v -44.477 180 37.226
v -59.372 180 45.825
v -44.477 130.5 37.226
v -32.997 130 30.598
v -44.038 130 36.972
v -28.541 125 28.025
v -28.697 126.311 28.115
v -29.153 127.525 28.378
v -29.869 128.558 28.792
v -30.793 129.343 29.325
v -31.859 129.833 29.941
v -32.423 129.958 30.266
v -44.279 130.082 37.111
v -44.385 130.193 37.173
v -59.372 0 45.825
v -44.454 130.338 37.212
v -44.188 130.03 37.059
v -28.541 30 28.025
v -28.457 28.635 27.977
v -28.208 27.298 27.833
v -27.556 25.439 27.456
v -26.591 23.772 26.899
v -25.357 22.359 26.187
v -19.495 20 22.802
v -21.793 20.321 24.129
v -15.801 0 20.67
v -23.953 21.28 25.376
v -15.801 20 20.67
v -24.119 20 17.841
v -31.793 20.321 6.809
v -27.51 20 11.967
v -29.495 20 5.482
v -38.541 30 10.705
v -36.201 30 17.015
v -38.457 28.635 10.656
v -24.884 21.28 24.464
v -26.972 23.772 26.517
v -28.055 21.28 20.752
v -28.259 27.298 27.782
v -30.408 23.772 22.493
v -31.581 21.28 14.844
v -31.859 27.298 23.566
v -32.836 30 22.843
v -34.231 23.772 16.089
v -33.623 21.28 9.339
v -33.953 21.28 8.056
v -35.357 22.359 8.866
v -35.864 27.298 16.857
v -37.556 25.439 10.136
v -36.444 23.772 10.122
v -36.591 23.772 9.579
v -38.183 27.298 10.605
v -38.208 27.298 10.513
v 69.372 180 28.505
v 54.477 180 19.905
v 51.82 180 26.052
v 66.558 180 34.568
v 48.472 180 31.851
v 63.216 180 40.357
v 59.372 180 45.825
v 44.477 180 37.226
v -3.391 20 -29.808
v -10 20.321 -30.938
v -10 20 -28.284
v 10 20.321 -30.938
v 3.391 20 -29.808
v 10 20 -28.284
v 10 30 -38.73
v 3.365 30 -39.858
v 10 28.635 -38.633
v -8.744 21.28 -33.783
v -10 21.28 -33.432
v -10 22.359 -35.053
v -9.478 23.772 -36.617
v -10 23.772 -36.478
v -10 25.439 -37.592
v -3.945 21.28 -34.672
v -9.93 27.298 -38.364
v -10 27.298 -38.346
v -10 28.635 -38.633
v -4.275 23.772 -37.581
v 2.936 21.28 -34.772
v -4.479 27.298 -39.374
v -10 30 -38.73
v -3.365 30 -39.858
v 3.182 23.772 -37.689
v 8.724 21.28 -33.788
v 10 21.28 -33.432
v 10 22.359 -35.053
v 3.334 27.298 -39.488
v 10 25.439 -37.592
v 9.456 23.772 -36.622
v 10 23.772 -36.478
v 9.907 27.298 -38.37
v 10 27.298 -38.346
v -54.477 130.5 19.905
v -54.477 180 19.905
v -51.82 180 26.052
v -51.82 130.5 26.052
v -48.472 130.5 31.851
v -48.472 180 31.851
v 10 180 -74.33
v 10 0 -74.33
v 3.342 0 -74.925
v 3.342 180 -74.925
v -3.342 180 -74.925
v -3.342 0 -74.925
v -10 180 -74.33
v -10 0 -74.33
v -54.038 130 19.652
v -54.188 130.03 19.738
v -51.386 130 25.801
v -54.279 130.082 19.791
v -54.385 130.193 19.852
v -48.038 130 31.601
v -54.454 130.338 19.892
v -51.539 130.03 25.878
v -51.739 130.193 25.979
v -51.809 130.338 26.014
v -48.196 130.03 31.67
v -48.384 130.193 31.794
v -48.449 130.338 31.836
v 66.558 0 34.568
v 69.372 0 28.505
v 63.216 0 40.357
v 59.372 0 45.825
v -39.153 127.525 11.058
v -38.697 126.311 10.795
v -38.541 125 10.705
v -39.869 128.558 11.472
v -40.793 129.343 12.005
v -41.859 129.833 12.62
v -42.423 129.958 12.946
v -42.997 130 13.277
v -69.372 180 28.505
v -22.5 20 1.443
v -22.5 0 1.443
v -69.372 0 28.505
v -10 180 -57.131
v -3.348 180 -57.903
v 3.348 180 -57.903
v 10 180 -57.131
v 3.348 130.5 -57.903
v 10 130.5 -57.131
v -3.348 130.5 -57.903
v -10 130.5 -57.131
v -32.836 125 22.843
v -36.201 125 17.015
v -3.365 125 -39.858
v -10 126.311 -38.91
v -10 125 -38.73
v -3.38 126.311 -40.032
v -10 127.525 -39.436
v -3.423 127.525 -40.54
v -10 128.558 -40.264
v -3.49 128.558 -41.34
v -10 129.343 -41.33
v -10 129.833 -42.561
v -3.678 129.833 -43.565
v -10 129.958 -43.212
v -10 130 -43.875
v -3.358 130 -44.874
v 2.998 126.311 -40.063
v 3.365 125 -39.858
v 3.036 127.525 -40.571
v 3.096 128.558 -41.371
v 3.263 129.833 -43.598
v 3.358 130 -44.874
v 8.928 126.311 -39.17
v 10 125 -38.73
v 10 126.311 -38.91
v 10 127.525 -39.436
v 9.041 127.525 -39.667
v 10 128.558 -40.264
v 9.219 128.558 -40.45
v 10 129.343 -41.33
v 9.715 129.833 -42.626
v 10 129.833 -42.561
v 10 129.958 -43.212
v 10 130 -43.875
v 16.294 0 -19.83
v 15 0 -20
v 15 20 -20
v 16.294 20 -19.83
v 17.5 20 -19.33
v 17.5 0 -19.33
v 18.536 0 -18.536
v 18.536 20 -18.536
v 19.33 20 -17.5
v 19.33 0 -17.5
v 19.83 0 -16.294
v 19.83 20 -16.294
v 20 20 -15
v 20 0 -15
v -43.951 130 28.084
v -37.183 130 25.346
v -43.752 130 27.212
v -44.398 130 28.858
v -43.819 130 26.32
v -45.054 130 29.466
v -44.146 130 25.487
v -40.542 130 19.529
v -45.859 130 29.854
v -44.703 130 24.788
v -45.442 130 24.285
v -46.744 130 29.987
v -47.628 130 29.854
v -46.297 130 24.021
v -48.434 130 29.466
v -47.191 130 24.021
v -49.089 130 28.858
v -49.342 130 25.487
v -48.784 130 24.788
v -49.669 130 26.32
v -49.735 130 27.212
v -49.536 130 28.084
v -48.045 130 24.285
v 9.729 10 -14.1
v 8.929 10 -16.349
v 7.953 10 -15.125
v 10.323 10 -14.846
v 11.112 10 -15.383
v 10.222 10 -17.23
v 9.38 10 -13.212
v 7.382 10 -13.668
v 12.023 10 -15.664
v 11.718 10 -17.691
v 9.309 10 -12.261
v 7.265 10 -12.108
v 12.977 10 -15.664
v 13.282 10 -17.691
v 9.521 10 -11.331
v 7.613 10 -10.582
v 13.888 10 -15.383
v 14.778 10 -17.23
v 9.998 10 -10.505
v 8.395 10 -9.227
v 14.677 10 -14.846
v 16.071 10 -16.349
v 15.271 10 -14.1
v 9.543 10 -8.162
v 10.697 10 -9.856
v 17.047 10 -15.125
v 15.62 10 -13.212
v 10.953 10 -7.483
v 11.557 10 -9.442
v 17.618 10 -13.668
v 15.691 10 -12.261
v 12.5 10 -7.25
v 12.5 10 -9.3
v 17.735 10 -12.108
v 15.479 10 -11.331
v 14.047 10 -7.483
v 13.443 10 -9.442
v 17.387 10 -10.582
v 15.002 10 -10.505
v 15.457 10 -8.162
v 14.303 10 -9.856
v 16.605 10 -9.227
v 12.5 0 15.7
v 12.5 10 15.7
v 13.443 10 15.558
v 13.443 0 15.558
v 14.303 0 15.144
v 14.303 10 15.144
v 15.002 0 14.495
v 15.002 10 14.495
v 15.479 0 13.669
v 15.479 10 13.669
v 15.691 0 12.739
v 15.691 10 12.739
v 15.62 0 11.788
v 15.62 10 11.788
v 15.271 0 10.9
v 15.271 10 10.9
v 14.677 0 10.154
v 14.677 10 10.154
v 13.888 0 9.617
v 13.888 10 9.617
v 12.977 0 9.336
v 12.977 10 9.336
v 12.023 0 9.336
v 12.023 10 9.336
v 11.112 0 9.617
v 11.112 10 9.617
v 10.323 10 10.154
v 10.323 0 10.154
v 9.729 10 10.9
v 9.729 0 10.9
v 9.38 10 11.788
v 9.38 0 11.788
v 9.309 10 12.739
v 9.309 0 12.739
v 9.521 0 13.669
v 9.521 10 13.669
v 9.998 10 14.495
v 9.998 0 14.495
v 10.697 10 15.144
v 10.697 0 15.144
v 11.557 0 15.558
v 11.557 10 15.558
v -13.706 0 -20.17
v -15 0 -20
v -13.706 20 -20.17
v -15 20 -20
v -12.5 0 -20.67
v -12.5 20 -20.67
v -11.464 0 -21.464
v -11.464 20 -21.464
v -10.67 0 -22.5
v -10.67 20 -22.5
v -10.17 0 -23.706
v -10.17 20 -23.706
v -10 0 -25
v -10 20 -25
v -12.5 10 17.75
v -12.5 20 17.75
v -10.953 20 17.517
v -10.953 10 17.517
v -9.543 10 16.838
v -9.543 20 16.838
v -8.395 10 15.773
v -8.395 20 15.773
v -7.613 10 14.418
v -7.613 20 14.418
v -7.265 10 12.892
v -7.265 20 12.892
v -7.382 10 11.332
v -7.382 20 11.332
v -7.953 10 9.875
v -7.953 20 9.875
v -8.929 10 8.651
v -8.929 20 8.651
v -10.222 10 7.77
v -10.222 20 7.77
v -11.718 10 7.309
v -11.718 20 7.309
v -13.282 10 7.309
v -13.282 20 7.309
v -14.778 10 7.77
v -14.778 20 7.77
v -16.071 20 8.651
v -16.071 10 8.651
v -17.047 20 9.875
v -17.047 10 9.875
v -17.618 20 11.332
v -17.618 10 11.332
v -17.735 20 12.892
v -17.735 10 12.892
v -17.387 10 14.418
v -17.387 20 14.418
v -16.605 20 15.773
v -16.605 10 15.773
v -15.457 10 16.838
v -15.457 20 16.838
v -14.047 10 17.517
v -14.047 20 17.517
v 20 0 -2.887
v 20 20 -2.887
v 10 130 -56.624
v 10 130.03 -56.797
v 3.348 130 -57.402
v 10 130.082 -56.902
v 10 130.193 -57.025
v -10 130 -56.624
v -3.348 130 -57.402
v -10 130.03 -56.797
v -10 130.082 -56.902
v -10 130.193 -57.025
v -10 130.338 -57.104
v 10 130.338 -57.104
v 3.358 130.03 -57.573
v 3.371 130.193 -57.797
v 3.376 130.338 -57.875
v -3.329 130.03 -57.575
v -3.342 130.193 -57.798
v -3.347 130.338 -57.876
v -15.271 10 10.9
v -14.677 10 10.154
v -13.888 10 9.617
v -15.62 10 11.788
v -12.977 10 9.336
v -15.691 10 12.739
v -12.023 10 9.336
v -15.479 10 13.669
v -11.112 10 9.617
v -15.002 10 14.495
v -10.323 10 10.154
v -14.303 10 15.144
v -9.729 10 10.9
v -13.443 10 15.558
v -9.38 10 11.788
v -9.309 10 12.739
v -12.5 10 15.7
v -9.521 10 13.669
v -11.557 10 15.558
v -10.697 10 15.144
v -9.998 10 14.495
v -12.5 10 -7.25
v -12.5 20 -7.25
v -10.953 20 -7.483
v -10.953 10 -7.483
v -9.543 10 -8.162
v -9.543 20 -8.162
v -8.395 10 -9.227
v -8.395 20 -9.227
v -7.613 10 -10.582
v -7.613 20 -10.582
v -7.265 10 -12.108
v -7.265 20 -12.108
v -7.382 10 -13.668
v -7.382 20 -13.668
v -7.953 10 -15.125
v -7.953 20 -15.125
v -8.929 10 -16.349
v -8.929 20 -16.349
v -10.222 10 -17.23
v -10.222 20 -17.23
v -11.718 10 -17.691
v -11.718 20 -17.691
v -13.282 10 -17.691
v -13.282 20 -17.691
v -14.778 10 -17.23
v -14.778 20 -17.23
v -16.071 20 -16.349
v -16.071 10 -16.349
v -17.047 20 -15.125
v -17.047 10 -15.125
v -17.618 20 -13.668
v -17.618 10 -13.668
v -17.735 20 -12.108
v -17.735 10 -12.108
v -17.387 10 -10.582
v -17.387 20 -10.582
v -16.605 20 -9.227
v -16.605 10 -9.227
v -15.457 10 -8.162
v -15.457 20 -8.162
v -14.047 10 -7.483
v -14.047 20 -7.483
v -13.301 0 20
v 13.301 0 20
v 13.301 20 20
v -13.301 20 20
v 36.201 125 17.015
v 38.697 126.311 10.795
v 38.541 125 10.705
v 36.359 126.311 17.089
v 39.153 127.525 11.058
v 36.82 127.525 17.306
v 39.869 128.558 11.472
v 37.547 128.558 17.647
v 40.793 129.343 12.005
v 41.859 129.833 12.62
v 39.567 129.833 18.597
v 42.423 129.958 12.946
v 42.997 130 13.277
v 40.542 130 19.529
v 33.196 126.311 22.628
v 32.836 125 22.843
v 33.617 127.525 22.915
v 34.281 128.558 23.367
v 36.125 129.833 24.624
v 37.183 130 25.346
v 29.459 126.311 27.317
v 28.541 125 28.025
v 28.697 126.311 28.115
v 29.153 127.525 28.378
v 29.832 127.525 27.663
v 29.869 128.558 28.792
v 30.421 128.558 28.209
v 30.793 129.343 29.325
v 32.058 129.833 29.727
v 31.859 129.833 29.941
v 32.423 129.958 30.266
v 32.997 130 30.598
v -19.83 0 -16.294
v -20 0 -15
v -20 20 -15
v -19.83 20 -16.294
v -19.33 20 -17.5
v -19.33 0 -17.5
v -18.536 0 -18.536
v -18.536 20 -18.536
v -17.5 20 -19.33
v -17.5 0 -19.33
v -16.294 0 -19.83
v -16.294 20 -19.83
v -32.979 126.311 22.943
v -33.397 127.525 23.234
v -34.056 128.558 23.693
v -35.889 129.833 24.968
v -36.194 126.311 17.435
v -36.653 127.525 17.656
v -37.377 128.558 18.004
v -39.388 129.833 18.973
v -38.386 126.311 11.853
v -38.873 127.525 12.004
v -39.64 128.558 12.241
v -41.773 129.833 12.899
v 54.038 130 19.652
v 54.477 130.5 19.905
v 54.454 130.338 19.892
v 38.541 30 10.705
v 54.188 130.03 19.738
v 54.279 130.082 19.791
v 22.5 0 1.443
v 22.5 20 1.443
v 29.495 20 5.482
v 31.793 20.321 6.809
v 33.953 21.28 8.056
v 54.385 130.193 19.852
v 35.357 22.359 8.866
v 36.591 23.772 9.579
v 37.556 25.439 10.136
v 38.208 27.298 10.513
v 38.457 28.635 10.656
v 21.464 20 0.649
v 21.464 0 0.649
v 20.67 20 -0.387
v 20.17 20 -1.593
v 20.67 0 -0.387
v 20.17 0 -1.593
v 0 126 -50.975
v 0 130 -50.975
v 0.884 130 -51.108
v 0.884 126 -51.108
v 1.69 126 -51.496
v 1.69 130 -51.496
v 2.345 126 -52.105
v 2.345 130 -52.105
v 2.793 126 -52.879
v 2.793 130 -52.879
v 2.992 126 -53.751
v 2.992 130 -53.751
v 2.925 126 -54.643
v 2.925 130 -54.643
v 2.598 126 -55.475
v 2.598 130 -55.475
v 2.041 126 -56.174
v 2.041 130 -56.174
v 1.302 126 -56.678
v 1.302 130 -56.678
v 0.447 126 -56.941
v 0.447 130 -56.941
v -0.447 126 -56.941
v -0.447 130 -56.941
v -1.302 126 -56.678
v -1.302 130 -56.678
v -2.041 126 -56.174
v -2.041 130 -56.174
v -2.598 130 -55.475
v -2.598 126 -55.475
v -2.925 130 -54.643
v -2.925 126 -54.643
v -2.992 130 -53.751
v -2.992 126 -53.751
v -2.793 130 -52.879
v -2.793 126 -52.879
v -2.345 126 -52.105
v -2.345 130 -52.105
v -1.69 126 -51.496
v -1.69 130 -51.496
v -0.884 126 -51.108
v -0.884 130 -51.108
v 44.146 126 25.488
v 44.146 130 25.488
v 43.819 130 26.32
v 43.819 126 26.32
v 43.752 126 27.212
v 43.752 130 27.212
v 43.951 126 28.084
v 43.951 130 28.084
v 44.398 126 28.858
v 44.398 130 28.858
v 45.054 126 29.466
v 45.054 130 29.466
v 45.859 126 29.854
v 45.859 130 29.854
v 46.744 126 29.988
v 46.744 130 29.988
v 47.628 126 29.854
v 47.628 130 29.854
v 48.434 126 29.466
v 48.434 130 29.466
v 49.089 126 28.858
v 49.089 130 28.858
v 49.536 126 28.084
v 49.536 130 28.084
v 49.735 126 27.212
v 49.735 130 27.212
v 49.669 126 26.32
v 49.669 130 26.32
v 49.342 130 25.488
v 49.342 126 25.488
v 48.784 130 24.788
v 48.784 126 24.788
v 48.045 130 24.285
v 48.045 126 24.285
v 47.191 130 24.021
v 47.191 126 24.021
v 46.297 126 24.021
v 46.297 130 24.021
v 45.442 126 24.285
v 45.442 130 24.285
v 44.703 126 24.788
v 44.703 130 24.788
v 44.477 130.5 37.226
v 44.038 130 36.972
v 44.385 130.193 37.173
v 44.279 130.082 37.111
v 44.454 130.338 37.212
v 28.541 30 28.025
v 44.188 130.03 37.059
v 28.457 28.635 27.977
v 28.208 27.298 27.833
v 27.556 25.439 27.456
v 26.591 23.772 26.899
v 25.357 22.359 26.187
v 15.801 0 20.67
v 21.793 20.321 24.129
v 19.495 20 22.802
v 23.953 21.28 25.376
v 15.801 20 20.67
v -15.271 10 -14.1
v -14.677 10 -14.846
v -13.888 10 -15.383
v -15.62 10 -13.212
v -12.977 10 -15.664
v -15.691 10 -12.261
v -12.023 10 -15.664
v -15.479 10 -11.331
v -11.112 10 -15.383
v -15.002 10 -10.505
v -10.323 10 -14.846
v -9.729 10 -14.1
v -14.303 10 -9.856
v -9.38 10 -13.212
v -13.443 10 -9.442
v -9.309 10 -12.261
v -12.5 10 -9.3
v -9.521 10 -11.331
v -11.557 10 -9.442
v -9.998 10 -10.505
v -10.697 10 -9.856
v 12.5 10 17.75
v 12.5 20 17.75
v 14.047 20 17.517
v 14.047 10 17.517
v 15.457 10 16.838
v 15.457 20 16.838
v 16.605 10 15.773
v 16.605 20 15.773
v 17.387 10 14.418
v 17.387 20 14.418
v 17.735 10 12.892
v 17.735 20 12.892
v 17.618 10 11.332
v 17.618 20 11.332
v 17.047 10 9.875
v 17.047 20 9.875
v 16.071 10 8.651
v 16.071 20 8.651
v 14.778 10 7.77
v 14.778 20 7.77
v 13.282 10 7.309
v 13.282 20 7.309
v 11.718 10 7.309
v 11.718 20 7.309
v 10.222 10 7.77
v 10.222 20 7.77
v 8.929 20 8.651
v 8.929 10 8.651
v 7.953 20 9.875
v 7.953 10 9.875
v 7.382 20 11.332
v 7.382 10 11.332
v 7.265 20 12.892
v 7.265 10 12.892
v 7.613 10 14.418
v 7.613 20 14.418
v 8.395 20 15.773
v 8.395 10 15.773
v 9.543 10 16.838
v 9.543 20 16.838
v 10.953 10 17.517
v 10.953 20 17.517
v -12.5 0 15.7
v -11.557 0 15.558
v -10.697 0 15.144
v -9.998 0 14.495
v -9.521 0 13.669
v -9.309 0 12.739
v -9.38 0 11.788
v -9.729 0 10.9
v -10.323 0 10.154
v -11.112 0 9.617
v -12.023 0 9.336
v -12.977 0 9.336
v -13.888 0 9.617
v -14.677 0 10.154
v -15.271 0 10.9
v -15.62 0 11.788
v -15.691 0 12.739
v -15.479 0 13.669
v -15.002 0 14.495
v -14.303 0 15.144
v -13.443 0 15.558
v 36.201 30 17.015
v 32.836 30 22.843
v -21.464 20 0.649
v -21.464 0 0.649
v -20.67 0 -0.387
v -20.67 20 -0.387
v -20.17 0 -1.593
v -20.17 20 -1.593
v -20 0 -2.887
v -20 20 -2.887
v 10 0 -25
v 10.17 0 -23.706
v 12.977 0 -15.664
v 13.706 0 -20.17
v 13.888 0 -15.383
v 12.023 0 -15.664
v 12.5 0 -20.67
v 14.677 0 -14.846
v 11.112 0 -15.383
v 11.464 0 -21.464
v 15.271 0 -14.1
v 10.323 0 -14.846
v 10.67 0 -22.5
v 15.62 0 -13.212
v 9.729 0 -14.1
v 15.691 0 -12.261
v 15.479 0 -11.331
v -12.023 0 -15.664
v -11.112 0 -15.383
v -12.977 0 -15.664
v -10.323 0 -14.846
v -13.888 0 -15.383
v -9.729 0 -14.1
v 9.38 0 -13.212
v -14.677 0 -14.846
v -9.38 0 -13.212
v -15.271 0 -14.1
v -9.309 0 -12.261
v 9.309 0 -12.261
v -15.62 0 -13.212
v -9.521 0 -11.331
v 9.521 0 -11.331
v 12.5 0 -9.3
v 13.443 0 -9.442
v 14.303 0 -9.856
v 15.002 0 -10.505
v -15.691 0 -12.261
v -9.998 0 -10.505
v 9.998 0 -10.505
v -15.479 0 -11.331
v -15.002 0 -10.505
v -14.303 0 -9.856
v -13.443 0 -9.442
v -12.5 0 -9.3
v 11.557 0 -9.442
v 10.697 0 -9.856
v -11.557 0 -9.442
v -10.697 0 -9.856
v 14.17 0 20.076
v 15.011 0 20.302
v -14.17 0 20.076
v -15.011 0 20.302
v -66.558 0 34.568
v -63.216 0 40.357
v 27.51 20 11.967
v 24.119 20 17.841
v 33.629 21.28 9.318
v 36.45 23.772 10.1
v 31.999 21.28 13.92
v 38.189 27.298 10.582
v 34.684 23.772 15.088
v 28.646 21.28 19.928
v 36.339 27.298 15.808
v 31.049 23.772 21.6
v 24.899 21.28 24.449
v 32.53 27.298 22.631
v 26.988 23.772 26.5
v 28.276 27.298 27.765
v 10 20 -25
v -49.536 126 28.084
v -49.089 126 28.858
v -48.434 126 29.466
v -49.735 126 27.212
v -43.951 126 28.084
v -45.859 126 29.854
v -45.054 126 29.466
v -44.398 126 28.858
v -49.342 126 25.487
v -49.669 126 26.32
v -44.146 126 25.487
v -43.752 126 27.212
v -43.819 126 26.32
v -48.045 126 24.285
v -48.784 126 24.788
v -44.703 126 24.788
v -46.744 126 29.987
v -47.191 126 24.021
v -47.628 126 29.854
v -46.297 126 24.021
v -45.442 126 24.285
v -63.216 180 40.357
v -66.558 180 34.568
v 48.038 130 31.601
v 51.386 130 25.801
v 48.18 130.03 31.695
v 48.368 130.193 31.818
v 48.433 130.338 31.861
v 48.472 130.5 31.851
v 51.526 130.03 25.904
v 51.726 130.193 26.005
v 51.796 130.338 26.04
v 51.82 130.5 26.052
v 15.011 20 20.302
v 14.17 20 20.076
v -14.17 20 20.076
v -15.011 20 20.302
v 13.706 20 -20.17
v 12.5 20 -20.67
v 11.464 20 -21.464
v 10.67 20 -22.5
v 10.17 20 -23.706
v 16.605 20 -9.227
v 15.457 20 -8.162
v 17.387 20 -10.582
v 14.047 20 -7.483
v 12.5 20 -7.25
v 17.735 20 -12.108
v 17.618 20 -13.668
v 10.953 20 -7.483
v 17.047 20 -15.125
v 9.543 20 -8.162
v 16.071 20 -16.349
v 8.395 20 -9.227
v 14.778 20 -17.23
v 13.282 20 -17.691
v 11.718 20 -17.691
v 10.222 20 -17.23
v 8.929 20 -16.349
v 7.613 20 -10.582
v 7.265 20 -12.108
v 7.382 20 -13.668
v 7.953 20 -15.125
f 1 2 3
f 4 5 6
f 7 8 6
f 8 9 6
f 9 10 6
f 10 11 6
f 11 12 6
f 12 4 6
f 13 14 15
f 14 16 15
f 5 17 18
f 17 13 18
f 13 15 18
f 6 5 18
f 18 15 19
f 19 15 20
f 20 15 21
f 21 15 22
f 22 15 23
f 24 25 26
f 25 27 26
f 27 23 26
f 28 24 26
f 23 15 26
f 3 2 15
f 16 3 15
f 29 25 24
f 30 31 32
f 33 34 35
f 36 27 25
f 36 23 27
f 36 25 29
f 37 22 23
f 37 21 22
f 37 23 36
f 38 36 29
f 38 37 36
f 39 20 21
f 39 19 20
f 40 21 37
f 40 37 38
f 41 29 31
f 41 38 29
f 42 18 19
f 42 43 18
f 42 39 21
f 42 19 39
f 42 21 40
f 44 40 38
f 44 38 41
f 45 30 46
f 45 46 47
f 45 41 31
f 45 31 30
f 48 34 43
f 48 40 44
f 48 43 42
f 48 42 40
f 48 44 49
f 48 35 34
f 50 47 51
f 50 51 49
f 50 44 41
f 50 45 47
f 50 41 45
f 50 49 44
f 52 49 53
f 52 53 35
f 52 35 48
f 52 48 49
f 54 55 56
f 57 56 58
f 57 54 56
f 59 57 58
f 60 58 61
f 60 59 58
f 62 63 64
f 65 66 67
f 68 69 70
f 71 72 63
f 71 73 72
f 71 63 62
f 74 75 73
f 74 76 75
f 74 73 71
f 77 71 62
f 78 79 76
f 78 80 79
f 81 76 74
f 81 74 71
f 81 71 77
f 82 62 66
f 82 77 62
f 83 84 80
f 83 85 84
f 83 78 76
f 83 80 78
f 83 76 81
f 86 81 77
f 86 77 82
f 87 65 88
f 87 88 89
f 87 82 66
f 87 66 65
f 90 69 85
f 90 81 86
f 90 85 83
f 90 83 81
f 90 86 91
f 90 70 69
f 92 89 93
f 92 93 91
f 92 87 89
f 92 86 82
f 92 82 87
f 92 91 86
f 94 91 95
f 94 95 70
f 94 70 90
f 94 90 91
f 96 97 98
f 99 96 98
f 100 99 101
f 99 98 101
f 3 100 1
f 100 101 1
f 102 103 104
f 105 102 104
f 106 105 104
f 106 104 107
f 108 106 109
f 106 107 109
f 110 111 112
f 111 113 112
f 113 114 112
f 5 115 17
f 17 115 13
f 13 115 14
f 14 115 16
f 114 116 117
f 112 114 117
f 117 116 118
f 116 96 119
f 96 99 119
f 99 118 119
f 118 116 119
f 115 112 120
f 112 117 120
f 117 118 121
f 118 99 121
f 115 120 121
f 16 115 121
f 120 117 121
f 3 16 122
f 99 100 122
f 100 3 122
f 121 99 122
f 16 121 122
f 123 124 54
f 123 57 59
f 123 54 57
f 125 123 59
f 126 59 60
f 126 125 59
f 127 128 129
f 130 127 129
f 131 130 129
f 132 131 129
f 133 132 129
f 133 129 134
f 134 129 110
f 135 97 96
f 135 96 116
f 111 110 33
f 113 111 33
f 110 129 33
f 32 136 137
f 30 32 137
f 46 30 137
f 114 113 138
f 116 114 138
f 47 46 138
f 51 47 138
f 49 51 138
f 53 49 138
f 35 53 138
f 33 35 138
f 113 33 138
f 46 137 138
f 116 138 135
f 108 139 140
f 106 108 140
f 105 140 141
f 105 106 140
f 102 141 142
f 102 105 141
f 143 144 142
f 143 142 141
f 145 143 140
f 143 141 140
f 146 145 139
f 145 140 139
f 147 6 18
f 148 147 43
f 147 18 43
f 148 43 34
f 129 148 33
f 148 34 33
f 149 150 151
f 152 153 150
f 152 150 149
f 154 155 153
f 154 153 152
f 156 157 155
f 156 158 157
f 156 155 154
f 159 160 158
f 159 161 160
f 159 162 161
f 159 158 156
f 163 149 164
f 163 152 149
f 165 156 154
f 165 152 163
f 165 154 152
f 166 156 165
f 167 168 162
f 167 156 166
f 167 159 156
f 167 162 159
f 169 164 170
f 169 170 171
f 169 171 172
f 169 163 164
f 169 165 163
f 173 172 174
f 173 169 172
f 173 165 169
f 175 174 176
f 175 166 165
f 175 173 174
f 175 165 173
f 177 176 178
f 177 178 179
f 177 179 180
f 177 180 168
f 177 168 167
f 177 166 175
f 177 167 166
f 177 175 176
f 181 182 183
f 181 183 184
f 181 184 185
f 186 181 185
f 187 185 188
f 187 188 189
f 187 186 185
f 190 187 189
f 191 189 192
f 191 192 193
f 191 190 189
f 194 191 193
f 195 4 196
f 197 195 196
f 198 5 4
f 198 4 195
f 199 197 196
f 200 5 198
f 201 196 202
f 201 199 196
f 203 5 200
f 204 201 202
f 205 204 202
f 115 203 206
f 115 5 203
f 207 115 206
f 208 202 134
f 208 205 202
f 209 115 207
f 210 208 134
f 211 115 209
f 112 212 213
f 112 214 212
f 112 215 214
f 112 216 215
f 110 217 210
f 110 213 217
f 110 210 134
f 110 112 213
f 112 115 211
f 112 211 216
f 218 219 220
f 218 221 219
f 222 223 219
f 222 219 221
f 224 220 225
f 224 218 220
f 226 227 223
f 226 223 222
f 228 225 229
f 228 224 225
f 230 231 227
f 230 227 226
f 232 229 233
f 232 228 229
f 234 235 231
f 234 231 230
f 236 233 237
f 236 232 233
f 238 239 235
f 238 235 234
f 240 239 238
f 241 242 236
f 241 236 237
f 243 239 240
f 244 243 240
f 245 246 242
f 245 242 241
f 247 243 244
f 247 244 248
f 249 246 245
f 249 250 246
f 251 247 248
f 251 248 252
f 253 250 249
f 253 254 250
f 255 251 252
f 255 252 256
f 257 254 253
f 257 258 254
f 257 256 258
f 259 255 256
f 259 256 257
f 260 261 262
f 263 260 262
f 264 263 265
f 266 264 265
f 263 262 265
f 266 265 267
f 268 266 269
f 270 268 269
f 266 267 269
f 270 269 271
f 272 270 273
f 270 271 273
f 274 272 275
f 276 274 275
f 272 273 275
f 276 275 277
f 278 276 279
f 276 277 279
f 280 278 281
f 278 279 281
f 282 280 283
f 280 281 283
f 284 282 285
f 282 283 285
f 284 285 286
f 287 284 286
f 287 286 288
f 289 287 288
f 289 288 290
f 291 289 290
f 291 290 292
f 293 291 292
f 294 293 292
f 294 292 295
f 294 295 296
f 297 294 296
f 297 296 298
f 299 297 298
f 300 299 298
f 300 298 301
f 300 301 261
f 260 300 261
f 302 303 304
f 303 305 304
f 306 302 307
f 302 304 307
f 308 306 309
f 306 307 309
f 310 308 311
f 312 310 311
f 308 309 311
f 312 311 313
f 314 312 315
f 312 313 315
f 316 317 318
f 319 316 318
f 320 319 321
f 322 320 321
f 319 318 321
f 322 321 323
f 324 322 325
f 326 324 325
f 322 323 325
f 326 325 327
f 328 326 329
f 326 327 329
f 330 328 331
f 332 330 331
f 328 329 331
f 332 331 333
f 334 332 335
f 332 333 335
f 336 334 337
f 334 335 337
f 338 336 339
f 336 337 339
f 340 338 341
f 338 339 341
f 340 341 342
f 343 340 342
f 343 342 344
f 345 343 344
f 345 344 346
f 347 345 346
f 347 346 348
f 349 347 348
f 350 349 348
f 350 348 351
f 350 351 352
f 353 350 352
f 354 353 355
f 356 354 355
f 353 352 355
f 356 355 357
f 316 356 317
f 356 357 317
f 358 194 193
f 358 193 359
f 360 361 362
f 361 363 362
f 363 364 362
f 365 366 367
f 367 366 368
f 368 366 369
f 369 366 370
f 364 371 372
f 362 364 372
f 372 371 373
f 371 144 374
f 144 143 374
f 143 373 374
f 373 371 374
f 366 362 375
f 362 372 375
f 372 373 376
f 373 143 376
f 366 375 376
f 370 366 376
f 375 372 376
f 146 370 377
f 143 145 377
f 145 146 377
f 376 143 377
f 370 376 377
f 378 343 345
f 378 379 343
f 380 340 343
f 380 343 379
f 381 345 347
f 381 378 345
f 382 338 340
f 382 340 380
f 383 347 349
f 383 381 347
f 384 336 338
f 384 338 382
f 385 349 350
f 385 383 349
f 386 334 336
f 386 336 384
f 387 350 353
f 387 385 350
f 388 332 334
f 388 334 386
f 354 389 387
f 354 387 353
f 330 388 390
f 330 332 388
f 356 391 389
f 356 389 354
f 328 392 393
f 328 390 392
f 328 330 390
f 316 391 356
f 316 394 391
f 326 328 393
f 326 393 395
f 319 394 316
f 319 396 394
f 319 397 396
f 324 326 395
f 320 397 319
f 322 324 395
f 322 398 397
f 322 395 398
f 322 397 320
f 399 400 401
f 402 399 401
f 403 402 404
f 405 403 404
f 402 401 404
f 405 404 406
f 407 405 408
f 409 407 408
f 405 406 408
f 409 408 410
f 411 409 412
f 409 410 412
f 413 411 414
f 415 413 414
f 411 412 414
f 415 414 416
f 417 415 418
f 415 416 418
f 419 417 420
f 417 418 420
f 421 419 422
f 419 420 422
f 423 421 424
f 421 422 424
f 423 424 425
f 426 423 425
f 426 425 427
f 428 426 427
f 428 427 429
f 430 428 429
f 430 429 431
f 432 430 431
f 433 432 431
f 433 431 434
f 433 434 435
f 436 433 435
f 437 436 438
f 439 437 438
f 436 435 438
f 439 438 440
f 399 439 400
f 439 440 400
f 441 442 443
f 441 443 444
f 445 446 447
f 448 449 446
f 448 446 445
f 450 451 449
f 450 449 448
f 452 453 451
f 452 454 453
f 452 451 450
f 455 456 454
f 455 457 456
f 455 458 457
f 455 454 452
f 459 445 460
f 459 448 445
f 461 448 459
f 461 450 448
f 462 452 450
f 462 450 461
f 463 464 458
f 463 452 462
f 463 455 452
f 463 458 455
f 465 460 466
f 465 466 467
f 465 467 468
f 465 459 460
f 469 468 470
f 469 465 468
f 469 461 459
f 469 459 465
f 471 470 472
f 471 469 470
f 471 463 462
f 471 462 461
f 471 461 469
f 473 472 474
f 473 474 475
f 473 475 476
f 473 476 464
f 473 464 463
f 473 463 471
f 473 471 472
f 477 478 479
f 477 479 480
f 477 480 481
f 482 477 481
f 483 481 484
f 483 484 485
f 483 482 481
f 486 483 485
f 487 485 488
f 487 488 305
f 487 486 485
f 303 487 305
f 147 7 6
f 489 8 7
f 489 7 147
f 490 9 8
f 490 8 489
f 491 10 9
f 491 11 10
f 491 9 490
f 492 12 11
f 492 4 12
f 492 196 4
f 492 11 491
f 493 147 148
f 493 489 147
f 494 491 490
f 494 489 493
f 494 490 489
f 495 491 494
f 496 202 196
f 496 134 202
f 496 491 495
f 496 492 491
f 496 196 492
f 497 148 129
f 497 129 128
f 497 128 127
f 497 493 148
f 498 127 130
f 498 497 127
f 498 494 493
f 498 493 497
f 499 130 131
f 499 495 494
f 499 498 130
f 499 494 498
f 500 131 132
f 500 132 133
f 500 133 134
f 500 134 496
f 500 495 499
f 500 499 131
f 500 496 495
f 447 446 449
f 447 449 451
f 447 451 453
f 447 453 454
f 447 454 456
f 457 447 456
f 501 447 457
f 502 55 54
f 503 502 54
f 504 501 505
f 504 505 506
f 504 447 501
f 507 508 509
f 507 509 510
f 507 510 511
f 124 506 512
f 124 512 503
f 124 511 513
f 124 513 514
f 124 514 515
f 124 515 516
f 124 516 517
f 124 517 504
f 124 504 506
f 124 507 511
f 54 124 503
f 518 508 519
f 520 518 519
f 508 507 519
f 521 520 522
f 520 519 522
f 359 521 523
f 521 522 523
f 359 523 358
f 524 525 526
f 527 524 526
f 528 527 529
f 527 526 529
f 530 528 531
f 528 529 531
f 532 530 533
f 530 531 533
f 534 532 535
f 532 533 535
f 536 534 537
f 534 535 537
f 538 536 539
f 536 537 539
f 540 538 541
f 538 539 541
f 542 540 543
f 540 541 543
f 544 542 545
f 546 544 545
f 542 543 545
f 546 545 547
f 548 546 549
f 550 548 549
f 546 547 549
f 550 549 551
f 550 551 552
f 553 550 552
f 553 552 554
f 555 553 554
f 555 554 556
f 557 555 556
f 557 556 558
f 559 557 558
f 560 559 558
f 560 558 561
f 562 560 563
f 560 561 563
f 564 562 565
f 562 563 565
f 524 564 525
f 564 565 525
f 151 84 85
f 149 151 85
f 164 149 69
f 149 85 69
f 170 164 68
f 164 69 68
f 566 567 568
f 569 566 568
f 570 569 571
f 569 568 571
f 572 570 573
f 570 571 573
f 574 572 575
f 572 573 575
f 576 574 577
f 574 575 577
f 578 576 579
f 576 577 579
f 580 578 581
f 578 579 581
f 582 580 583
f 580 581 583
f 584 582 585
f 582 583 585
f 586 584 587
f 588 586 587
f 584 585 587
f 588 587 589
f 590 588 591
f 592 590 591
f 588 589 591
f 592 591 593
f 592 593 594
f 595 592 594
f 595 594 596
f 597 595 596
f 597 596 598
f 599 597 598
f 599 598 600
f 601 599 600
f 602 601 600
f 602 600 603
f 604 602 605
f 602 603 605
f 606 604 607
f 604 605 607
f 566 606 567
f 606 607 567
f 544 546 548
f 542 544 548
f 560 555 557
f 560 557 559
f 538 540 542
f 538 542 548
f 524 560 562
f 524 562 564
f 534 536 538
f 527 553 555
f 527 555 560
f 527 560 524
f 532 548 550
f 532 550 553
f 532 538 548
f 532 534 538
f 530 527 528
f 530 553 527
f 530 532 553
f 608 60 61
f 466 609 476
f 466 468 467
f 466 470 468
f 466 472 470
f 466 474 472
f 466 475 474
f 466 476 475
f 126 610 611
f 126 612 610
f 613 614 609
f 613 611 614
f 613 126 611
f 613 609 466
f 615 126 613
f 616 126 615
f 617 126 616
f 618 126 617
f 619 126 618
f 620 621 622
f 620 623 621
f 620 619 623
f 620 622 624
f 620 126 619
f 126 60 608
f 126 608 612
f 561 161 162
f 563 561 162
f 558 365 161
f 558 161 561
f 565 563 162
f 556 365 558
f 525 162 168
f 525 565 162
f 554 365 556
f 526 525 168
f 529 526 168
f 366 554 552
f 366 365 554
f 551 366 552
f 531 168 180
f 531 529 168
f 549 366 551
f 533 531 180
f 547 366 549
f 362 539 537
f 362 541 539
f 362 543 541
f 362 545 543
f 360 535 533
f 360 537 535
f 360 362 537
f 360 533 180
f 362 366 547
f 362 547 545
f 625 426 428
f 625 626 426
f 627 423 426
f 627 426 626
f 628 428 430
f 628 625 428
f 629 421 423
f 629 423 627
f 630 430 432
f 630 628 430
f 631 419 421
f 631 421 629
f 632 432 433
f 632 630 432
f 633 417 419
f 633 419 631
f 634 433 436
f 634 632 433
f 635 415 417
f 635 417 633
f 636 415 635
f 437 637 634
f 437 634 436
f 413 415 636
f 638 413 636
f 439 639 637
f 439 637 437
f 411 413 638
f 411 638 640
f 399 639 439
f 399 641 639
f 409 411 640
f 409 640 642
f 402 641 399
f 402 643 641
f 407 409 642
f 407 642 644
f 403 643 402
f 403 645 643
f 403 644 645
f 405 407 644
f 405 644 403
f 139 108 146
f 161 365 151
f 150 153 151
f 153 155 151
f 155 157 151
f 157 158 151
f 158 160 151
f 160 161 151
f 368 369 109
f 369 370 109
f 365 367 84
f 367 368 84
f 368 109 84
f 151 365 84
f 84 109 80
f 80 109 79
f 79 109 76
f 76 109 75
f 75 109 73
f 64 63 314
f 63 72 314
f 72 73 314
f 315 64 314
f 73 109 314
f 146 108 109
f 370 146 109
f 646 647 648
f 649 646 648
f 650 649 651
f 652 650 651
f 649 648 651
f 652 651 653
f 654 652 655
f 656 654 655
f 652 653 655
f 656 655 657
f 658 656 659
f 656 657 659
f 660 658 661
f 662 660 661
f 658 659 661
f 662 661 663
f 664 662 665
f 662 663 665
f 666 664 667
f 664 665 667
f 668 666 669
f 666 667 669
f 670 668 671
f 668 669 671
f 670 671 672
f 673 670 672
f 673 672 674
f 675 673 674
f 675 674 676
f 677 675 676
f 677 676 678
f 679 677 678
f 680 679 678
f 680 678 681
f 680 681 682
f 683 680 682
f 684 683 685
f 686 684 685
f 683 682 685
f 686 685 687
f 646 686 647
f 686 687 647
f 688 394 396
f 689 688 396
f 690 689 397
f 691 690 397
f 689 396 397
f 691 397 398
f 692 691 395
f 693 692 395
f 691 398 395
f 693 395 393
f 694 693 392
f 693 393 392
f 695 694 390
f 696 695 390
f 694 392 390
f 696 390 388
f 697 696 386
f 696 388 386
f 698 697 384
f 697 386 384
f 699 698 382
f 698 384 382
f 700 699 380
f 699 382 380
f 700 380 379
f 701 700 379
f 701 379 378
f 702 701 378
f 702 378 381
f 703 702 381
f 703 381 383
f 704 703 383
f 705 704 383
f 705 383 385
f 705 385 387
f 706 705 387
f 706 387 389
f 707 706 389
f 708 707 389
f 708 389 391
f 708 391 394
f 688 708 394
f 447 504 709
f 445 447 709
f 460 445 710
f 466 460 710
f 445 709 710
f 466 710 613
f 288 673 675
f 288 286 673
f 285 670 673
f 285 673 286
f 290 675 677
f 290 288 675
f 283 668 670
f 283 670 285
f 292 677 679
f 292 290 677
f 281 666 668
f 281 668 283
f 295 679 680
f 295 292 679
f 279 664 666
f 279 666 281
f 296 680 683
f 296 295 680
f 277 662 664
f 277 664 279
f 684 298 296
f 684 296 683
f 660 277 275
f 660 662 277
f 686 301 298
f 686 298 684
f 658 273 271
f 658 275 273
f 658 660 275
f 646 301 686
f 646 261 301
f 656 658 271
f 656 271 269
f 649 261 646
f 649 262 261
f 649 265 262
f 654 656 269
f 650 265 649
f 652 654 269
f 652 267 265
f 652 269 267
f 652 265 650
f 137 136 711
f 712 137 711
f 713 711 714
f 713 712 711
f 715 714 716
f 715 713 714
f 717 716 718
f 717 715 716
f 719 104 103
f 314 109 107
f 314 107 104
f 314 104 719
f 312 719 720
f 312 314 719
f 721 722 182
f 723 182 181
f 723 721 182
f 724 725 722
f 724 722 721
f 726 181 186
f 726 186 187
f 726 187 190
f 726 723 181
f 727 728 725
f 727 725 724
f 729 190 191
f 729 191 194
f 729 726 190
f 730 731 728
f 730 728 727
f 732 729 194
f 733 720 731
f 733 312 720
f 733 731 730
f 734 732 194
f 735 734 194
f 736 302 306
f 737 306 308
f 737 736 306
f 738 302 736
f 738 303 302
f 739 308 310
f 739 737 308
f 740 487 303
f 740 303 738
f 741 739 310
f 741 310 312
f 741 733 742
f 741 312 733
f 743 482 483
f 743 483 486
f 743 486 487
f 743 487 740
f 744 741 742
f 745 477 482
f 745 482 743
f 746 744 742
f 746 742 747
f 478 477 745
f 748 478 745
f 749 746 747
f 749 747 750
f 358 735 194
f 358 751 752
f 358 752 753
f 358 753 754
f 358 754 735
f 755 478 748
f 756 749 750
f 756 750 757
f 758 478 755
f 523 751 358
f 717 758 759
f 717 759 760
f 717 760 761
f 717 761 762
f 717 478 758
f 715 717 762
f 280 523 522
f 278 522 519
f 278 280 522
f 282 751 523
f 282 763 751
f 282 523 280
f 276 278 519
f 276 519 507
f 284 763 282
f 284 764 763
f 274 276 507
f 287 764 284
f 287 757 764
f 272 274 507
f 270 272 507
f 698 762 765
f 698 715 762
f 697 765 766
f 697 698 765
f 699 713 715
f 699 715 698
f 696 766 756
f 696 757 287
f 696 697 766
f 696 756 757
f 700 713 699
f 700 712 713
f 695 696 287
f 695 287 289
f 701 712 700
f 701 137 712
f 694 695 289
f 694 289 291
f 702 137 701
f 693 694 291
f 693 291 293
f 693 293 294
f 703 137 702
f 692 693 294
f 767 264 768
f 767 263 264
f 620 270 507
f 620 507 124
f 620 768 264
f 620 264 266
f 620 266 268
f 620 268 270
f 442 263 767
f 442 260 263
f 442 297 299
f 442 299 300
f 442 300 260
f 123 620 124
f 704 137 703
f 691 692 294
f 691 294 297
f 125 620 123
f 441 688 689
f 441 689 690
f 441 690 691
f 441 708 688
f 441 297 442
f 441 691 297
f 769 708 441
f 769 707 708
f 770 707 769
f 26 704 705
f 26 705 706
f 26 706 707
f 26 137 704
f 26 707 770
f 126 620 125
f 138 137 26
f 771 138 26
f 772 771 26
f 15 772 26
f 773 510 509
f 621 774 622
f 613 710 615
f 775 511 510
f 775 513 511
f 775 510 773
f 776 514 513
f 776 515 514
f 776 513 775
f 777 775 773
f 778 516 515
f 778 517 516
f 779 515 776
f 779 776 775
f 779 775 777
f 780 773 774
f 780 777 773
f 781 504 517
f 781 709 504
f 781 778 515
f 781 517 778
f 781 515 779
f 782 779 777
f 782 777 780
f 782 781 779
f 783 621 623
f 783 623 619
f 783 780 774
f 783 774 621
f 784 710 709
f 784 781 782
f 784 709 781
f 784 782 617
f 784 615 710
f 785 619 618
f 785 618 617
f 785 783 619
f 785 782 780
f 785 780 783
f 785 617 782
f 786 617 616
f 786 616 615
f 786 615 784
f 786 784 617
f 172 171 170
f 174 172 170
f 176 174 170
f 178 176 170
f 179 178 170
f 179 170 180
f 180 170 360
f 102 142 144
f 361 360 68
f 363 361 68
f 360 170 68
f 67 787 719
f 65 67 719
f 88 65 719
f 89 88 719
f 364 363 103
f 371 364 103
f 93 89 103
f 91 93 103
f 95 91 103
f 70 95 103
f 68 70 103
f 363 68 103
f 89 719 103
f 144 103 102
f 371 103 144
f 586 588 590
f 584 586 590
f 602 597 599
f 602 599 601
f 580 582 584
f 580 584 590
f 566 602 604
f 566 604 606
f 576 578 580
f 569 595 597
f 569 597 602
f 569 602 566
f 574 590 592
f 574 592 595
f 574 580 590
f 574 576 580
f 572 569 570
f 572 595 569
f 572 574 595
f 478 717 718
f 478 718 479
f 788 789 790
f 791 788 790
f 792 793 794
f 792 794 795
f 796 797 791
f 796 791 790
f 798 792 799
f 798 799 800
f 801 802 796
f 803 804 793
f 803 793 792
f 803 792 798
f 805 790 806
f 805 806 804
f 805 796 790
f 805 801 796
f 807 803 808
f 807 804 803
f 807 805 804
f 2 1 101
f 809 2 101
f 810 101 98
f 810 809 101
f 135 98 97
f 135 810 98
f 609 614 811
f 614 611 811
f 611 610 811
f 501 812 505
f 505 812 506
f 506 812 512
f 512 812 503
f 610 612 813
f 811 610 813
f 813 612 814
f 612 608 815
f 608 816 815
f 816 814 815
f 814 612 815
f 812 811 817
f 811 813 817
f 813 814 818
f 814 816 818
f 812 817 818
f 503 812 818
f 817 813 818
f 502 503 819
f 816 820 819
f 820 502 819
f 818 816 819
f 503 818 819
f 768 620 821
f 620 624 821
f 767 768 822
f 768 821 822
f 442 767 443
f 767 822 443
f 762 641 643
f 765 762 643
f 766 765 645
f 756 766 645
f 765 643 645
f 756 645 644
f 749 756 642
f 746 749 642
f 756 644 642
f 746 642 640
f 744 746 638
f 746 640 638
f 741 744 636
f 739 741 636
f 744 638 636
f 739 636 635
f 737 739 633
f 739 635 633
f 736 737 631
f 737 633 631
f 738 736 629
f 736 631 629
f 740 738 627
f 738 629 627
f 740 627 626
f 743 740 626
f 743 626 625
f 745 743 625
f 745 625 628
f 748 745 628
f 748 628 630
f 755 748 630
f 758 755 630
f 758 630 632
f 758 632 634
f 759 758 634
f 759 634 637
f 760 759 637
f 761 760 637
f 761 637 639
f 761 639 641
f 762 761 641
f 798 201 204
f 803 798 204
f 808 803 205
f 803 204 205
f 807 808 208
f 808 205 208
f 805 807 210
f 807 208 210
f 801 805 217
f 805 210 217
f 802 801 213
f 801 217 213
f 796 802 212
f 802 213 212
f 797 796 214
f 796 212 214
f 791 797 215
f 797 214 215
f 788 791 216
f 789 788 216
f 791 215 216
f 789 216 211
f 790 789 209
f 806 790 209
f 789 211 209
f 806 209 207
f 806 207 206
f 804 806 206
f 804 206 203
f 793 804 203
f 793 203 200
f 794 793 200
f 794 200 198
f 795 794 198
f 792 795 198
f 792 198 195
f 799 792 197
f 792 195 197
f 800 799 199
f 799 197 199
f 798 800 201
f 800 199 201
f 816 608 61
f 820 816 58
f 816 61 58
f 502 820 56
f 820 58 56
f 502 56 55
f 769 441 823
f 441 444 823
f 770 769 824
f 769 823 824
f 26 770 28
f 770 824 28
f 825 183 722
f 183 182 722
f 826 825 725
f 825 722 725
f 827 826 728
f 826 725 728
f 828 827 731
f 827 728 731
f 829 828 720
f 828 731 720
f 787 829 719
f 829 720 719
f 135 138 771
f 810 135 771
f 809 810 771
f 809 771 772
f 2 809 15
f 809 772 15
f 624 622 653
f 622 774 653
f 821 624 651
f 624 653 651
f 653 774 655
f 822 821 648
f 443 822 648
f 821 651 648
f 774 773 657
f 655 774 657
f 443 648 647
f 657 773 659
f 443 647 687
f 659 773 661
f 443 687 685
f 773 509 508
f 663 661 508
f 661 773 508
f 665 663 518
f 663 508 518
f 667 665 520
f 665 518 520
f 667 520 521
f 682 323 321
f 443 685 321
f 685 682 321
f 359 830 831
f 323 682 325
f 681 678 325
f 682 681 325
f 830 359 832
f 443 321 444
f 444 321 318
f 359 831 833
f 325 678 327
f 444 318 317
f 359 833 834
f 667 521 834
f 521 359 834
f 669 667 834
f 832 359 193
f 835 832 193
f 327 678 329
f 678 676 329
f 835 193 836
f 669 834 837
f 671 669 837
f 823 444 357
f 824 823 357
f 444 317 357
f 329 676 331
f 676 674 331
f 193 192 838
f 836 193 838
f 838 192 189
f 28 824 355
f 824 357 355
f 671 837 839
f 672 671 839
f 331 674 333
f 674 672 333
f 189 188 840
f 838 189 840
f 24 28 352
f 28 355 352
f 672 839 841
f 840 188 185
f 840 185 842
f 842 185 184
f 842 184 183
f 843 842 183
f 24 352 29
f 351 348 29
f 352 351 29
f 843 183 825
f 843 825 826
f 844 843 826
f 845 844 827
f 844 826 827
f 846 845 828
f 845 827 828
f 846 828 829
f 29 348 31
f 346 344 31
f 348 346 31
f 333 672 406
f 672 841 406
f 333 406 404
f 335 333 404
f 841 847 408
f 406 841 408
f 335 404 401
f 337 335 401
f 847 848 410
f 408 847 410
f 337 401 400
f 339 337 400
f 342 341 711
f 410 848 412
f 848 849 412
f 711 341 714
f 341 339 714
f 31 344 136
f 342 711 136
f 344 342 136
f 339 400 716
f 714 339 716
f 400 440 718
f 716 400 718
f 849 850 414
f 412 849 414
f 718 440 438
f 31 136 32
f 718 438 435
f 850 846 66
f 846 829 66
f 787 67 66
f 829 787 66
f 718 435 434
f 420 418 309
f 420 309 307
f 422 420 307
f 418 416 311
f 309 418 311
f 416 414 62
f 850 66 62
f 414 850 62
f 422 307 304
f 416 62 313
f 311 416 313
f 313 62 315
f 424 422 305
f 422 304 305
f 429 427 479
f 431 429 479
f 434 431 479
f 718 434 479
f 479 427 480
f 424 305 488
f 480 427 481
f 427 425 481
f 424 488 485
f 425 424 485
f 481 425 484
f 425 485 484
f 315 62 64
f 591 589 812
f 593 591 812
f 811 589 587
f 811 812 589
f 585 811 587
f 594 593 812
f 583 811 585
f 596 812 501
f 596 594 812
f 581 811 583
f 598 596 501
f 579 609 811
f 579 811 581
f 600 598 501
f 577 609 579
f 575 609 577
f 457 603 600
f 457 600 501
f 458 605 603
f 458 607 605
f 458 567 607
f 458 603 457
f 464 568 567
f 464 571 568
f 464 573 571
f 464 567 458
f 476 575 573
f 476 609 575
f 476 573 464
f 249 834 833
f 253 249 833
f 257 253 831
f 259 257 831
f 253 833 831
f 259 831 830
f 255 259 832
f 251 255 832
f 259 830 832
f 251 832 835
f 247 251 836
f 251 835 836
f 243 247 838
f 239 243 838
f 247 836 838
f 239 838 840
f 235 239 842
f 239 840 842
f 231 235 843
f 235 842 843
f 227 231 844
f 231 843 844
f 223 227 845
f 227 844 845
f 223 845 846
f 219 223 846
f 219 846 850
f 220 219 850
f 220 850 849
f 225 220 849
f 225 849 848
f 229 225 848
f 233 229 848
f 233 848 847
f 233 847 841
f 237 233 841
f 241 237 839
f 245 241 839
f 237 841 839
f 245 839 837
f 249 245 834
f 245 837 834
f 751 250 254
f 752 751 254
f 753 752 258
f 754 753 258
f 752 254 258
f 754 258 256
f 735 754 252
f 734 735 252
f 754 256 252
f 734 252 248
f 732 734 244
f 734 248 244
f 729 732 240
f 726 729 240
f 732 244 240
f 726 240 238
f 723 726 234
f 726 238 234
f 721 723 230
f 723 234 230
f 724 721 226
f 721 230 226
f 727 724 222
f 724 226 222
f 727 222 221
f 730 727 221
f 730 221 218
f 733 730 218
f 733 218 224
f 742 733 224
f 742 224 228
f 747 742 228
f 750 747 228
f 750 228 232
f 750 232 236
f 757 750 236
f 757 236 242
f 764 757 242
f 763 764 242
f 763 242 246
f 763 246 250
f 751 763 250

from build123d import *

# Parameters (mm, degrees)
BOSS_EXTRUDE1_DEPTH = 20
BOSS_EXTRUDE2_DEPTH = 160
SKETCH3_R           = 58
CUT_EXTRUDE1_DEPTH  = 50
SKETCH4_R           = 3
CUT_EXTRUDE2_DEPTH  = 4
CIRPATTERN1_COUNT   = 3
BOSS_EXTRUDE3_DEPTH = 20
SKETCH5_R           = 3.2
CUT_EXTRUDE3_DEPTH  = 190.835375153
FILLET1_R           = 10
FILLET2_R           = 5
FILLET4_R           = 0.5
SKETCH7_R           = 5.25
CUT_EXTRUDE4_DEPTH  = 10


with BuildPart() as part:
    # Sketch1 → Boss-Extrude1 (new body)
    with BuildSketch(Plane(origin=(0, 0, 0), x_dir=(1, 0, 0), z_dir=(0, 1, 0))):
        with BuildLine():
            Line((-10, 0), (-10, 74.330343737))
            ThreePointArc((-10, 74.330343737), (0, 75), (10, 74.330343737))
            Line((10, 74.330343737), (10, 0))
            ThreePointArc((10, 0), (0, -10), (-10, 0))
        make_face()
    boss_extrude1 = extrude(amount=BOSS_EXTRUDE1_DEPTH)

    # Sketch2 → Boss-Extrude2 (add)
    with BuildSketch(Plane(origin=(0, 20, 0), x_dir=(1, 0, 0), z_dir=(0, 1, 0))):
        with BuildLine():
            Line((-10, 74.330343737), (-10, 38.729833462))
            ThreePointArc((-10, 38.729833462), (0, 40), (10, 38.729833462))
            Line((10, 38.729833462), (10, 74.330343737))
            ThreePointArc((10, 74.330343737), (0, 75), (-10, 74.330343737))
        make_face()
    boss_extrude2 = extrude(amount=BOSS_EXTRUDE2_DEPTH)

    # Sketch3 → Cut-Extrude1 (cut)
    with BuildSketch(Plane(origin=(0, 180, 0), x_dir=(1, 0, 0), z_dir=(0, 1, 0))):
        Circle(SKETCH3_R)
    cut_extrude1 = extrude(amount=-CUT_EXTRUDE1_DEPTH, mode=Mode.SUBTRACT)

    # Sketch4 → Cut-Extrude2 (cut)
    with BuildSketch(Plane(origin=(0, 130, 0), x_dir=(1, 0, 0), z_dir=(0, 1, 0))):
        with Locations(Location((0, 53.975, 0), (0, 0, 270))):
            Circle(SKETCH4_R)
    cut_extrude2 = extrude(amount=-CUT_EXTRUDE2_DEPTH, mode=Mode.SUBTRACT)

    # CirPattern1: Boss-Extrude1, Boss-Extrude2, Cut-Extrude1, Cut-Extrude2 ×3 about axis
    cirpattern1_axis = Axis((0, 0, 0), (0, 1, 0))
    add([boss_extrude1.rotate(cirpattern1_axis, i * 360 / CIRPATTERN1_COUNT) for i in range(1, CIRPATTERN1_COUNT)])
    add([boss_extrude2.rotate(cirpattern1_axis, i * 360 / CIRPATTERN1_COUNT) for i in range(1, CIRPATTERN1_COUNT)])
    add([cut_extrude1.rotate(cirpattern1_axis, i * 360 / CIRPATTERN1_COUNT) for i in range(1, CIRPATTERN1_COUNT)], mode=Mode.SUBTRACT)
    add([cut_extrude2.rotate(cirpattern1_axis, i * 360 / CIRPATTERN1_COUNT) for i in range(1, CIRPATTERN1_COUNT)], mode=Mode.SUBTRACT)

    # Sketch6 → Boss-Extrude3 (add)
    with BuildSketch(Plane(origin=(0, 0, 0), x_dir=(1, 0, 0), z_dir=(0, 1, 0))):
        with BuildLine():
            Line((15, -20), (-15, -20))
            ThreePointArc((-15, -20), (-18.535533906, -18.535533906), (-20, -15))
            Line((-20, -15), (-20, 15))
            ThreePointArc((-20, 15), (-18.535533906, 18.535533906), (-15, 20))
            Line((-15, 20), (15, 20))
            ThreePointArc((15, 20), (18.535533906, 18.535533906), (20, 15))
            Line((20, 15), (20, -15))
            ThreePointArc((20, -15), (18.535533906, -18.535533906), (15, -20))
        make_face()
    extrude(amount=BOSS_EXTRUDE3_DEPTH)

    # Sketch5 → Cut-Extrude3 (cut, through all)
    with BuildSketch(Plane(origin=(0, 20, 0), x_dir=(1, 0, 0), z_dir=(0, 1, 0))):
        with Locations(Location((-12.5, 12.5, 0), (0, 0, 270))):
            Circle(SKETCH5_R)
        with Locations(Location((12.5, 12.5, 0), (0, 0, 270))):
            Circle(SKETCH5_R)
        with Locations(Location((-12.5, -12.5, 0), (0, 0, 270))):
            Circle(SKETCH5_R)
        with Locations(Location((12.5, -12.5, 0), (0, 0, 270))):
            Circle(SKETCH5_R)
    extrude(amount=-CUT_EXTRUDE3_DEPTH, mode=Mode.SUBTRACT)

    # Fillet1
    fillet1_edges = [part.edges().sort_by_distance(p)[0] for p in [
        (0, 20, -40),
        (34.641016151, 20, 20),
        (-34.641016151, 20, 20),
    ]]
    fillet(fillet1_edges, radius=FILLET1_R)

    # Fillet2
    fillet2_edges = [part.edges().sort_by_distance(p)[0] for p in [
        (34.641016151, 130, 20),
        (-14.641016151, 10, 20),
        (-20, 10, 0),
        (20, 10, 0),
        (10, 10, -20),
        (-10, 10, -20),
        (14.641016151, 10, 20),
        (0, 130, -40),
        (-34.641016151, 130, 20),
    ]]
    fillet(fillet2_edges, radius=FILLET2_R - 0.0001)  # a hair under: the kernel refuses the full size

    # Fillet4
    fillet4_edges = [part.edges().sort_by_distance(p)[0] for p in [
        (50.229473419, 130, 29),
        (-50.229473419, 130, 29),
        (0, 130, -58),
    ]]
    fillet(fillet4_edges, radius=FILLET4_R)

    # Sketch7 → Cut-Extrude4 (cut)
    with BuildSketch(Plane(origin=(0, 20, 0), x_dir=(1, 0, 0), z_dir=(0, 1, 0))):
        with Locations(Location((-12.5, 12.5, 0), (0, 0, 270))):
            Circle(SKETCH7_R)
        with Locations(Location((12.5, 12.5, 0), (0, 0, 270))):
            Circle(SKETCH7_R)
        with Locations(Location((12.5, -12.5, 0), (0, 0, 270))):
            Circle(SKETCH7_R)
        with Locations(Location((-12.5, -12.5, 0), (0, 0, 270))):
            Circle(SKETCH7_R)
    extrude(amount=-CUT_EXTRUDE4_DEPTH, mode=Mode.SUBTRACT)


solid = part.part
